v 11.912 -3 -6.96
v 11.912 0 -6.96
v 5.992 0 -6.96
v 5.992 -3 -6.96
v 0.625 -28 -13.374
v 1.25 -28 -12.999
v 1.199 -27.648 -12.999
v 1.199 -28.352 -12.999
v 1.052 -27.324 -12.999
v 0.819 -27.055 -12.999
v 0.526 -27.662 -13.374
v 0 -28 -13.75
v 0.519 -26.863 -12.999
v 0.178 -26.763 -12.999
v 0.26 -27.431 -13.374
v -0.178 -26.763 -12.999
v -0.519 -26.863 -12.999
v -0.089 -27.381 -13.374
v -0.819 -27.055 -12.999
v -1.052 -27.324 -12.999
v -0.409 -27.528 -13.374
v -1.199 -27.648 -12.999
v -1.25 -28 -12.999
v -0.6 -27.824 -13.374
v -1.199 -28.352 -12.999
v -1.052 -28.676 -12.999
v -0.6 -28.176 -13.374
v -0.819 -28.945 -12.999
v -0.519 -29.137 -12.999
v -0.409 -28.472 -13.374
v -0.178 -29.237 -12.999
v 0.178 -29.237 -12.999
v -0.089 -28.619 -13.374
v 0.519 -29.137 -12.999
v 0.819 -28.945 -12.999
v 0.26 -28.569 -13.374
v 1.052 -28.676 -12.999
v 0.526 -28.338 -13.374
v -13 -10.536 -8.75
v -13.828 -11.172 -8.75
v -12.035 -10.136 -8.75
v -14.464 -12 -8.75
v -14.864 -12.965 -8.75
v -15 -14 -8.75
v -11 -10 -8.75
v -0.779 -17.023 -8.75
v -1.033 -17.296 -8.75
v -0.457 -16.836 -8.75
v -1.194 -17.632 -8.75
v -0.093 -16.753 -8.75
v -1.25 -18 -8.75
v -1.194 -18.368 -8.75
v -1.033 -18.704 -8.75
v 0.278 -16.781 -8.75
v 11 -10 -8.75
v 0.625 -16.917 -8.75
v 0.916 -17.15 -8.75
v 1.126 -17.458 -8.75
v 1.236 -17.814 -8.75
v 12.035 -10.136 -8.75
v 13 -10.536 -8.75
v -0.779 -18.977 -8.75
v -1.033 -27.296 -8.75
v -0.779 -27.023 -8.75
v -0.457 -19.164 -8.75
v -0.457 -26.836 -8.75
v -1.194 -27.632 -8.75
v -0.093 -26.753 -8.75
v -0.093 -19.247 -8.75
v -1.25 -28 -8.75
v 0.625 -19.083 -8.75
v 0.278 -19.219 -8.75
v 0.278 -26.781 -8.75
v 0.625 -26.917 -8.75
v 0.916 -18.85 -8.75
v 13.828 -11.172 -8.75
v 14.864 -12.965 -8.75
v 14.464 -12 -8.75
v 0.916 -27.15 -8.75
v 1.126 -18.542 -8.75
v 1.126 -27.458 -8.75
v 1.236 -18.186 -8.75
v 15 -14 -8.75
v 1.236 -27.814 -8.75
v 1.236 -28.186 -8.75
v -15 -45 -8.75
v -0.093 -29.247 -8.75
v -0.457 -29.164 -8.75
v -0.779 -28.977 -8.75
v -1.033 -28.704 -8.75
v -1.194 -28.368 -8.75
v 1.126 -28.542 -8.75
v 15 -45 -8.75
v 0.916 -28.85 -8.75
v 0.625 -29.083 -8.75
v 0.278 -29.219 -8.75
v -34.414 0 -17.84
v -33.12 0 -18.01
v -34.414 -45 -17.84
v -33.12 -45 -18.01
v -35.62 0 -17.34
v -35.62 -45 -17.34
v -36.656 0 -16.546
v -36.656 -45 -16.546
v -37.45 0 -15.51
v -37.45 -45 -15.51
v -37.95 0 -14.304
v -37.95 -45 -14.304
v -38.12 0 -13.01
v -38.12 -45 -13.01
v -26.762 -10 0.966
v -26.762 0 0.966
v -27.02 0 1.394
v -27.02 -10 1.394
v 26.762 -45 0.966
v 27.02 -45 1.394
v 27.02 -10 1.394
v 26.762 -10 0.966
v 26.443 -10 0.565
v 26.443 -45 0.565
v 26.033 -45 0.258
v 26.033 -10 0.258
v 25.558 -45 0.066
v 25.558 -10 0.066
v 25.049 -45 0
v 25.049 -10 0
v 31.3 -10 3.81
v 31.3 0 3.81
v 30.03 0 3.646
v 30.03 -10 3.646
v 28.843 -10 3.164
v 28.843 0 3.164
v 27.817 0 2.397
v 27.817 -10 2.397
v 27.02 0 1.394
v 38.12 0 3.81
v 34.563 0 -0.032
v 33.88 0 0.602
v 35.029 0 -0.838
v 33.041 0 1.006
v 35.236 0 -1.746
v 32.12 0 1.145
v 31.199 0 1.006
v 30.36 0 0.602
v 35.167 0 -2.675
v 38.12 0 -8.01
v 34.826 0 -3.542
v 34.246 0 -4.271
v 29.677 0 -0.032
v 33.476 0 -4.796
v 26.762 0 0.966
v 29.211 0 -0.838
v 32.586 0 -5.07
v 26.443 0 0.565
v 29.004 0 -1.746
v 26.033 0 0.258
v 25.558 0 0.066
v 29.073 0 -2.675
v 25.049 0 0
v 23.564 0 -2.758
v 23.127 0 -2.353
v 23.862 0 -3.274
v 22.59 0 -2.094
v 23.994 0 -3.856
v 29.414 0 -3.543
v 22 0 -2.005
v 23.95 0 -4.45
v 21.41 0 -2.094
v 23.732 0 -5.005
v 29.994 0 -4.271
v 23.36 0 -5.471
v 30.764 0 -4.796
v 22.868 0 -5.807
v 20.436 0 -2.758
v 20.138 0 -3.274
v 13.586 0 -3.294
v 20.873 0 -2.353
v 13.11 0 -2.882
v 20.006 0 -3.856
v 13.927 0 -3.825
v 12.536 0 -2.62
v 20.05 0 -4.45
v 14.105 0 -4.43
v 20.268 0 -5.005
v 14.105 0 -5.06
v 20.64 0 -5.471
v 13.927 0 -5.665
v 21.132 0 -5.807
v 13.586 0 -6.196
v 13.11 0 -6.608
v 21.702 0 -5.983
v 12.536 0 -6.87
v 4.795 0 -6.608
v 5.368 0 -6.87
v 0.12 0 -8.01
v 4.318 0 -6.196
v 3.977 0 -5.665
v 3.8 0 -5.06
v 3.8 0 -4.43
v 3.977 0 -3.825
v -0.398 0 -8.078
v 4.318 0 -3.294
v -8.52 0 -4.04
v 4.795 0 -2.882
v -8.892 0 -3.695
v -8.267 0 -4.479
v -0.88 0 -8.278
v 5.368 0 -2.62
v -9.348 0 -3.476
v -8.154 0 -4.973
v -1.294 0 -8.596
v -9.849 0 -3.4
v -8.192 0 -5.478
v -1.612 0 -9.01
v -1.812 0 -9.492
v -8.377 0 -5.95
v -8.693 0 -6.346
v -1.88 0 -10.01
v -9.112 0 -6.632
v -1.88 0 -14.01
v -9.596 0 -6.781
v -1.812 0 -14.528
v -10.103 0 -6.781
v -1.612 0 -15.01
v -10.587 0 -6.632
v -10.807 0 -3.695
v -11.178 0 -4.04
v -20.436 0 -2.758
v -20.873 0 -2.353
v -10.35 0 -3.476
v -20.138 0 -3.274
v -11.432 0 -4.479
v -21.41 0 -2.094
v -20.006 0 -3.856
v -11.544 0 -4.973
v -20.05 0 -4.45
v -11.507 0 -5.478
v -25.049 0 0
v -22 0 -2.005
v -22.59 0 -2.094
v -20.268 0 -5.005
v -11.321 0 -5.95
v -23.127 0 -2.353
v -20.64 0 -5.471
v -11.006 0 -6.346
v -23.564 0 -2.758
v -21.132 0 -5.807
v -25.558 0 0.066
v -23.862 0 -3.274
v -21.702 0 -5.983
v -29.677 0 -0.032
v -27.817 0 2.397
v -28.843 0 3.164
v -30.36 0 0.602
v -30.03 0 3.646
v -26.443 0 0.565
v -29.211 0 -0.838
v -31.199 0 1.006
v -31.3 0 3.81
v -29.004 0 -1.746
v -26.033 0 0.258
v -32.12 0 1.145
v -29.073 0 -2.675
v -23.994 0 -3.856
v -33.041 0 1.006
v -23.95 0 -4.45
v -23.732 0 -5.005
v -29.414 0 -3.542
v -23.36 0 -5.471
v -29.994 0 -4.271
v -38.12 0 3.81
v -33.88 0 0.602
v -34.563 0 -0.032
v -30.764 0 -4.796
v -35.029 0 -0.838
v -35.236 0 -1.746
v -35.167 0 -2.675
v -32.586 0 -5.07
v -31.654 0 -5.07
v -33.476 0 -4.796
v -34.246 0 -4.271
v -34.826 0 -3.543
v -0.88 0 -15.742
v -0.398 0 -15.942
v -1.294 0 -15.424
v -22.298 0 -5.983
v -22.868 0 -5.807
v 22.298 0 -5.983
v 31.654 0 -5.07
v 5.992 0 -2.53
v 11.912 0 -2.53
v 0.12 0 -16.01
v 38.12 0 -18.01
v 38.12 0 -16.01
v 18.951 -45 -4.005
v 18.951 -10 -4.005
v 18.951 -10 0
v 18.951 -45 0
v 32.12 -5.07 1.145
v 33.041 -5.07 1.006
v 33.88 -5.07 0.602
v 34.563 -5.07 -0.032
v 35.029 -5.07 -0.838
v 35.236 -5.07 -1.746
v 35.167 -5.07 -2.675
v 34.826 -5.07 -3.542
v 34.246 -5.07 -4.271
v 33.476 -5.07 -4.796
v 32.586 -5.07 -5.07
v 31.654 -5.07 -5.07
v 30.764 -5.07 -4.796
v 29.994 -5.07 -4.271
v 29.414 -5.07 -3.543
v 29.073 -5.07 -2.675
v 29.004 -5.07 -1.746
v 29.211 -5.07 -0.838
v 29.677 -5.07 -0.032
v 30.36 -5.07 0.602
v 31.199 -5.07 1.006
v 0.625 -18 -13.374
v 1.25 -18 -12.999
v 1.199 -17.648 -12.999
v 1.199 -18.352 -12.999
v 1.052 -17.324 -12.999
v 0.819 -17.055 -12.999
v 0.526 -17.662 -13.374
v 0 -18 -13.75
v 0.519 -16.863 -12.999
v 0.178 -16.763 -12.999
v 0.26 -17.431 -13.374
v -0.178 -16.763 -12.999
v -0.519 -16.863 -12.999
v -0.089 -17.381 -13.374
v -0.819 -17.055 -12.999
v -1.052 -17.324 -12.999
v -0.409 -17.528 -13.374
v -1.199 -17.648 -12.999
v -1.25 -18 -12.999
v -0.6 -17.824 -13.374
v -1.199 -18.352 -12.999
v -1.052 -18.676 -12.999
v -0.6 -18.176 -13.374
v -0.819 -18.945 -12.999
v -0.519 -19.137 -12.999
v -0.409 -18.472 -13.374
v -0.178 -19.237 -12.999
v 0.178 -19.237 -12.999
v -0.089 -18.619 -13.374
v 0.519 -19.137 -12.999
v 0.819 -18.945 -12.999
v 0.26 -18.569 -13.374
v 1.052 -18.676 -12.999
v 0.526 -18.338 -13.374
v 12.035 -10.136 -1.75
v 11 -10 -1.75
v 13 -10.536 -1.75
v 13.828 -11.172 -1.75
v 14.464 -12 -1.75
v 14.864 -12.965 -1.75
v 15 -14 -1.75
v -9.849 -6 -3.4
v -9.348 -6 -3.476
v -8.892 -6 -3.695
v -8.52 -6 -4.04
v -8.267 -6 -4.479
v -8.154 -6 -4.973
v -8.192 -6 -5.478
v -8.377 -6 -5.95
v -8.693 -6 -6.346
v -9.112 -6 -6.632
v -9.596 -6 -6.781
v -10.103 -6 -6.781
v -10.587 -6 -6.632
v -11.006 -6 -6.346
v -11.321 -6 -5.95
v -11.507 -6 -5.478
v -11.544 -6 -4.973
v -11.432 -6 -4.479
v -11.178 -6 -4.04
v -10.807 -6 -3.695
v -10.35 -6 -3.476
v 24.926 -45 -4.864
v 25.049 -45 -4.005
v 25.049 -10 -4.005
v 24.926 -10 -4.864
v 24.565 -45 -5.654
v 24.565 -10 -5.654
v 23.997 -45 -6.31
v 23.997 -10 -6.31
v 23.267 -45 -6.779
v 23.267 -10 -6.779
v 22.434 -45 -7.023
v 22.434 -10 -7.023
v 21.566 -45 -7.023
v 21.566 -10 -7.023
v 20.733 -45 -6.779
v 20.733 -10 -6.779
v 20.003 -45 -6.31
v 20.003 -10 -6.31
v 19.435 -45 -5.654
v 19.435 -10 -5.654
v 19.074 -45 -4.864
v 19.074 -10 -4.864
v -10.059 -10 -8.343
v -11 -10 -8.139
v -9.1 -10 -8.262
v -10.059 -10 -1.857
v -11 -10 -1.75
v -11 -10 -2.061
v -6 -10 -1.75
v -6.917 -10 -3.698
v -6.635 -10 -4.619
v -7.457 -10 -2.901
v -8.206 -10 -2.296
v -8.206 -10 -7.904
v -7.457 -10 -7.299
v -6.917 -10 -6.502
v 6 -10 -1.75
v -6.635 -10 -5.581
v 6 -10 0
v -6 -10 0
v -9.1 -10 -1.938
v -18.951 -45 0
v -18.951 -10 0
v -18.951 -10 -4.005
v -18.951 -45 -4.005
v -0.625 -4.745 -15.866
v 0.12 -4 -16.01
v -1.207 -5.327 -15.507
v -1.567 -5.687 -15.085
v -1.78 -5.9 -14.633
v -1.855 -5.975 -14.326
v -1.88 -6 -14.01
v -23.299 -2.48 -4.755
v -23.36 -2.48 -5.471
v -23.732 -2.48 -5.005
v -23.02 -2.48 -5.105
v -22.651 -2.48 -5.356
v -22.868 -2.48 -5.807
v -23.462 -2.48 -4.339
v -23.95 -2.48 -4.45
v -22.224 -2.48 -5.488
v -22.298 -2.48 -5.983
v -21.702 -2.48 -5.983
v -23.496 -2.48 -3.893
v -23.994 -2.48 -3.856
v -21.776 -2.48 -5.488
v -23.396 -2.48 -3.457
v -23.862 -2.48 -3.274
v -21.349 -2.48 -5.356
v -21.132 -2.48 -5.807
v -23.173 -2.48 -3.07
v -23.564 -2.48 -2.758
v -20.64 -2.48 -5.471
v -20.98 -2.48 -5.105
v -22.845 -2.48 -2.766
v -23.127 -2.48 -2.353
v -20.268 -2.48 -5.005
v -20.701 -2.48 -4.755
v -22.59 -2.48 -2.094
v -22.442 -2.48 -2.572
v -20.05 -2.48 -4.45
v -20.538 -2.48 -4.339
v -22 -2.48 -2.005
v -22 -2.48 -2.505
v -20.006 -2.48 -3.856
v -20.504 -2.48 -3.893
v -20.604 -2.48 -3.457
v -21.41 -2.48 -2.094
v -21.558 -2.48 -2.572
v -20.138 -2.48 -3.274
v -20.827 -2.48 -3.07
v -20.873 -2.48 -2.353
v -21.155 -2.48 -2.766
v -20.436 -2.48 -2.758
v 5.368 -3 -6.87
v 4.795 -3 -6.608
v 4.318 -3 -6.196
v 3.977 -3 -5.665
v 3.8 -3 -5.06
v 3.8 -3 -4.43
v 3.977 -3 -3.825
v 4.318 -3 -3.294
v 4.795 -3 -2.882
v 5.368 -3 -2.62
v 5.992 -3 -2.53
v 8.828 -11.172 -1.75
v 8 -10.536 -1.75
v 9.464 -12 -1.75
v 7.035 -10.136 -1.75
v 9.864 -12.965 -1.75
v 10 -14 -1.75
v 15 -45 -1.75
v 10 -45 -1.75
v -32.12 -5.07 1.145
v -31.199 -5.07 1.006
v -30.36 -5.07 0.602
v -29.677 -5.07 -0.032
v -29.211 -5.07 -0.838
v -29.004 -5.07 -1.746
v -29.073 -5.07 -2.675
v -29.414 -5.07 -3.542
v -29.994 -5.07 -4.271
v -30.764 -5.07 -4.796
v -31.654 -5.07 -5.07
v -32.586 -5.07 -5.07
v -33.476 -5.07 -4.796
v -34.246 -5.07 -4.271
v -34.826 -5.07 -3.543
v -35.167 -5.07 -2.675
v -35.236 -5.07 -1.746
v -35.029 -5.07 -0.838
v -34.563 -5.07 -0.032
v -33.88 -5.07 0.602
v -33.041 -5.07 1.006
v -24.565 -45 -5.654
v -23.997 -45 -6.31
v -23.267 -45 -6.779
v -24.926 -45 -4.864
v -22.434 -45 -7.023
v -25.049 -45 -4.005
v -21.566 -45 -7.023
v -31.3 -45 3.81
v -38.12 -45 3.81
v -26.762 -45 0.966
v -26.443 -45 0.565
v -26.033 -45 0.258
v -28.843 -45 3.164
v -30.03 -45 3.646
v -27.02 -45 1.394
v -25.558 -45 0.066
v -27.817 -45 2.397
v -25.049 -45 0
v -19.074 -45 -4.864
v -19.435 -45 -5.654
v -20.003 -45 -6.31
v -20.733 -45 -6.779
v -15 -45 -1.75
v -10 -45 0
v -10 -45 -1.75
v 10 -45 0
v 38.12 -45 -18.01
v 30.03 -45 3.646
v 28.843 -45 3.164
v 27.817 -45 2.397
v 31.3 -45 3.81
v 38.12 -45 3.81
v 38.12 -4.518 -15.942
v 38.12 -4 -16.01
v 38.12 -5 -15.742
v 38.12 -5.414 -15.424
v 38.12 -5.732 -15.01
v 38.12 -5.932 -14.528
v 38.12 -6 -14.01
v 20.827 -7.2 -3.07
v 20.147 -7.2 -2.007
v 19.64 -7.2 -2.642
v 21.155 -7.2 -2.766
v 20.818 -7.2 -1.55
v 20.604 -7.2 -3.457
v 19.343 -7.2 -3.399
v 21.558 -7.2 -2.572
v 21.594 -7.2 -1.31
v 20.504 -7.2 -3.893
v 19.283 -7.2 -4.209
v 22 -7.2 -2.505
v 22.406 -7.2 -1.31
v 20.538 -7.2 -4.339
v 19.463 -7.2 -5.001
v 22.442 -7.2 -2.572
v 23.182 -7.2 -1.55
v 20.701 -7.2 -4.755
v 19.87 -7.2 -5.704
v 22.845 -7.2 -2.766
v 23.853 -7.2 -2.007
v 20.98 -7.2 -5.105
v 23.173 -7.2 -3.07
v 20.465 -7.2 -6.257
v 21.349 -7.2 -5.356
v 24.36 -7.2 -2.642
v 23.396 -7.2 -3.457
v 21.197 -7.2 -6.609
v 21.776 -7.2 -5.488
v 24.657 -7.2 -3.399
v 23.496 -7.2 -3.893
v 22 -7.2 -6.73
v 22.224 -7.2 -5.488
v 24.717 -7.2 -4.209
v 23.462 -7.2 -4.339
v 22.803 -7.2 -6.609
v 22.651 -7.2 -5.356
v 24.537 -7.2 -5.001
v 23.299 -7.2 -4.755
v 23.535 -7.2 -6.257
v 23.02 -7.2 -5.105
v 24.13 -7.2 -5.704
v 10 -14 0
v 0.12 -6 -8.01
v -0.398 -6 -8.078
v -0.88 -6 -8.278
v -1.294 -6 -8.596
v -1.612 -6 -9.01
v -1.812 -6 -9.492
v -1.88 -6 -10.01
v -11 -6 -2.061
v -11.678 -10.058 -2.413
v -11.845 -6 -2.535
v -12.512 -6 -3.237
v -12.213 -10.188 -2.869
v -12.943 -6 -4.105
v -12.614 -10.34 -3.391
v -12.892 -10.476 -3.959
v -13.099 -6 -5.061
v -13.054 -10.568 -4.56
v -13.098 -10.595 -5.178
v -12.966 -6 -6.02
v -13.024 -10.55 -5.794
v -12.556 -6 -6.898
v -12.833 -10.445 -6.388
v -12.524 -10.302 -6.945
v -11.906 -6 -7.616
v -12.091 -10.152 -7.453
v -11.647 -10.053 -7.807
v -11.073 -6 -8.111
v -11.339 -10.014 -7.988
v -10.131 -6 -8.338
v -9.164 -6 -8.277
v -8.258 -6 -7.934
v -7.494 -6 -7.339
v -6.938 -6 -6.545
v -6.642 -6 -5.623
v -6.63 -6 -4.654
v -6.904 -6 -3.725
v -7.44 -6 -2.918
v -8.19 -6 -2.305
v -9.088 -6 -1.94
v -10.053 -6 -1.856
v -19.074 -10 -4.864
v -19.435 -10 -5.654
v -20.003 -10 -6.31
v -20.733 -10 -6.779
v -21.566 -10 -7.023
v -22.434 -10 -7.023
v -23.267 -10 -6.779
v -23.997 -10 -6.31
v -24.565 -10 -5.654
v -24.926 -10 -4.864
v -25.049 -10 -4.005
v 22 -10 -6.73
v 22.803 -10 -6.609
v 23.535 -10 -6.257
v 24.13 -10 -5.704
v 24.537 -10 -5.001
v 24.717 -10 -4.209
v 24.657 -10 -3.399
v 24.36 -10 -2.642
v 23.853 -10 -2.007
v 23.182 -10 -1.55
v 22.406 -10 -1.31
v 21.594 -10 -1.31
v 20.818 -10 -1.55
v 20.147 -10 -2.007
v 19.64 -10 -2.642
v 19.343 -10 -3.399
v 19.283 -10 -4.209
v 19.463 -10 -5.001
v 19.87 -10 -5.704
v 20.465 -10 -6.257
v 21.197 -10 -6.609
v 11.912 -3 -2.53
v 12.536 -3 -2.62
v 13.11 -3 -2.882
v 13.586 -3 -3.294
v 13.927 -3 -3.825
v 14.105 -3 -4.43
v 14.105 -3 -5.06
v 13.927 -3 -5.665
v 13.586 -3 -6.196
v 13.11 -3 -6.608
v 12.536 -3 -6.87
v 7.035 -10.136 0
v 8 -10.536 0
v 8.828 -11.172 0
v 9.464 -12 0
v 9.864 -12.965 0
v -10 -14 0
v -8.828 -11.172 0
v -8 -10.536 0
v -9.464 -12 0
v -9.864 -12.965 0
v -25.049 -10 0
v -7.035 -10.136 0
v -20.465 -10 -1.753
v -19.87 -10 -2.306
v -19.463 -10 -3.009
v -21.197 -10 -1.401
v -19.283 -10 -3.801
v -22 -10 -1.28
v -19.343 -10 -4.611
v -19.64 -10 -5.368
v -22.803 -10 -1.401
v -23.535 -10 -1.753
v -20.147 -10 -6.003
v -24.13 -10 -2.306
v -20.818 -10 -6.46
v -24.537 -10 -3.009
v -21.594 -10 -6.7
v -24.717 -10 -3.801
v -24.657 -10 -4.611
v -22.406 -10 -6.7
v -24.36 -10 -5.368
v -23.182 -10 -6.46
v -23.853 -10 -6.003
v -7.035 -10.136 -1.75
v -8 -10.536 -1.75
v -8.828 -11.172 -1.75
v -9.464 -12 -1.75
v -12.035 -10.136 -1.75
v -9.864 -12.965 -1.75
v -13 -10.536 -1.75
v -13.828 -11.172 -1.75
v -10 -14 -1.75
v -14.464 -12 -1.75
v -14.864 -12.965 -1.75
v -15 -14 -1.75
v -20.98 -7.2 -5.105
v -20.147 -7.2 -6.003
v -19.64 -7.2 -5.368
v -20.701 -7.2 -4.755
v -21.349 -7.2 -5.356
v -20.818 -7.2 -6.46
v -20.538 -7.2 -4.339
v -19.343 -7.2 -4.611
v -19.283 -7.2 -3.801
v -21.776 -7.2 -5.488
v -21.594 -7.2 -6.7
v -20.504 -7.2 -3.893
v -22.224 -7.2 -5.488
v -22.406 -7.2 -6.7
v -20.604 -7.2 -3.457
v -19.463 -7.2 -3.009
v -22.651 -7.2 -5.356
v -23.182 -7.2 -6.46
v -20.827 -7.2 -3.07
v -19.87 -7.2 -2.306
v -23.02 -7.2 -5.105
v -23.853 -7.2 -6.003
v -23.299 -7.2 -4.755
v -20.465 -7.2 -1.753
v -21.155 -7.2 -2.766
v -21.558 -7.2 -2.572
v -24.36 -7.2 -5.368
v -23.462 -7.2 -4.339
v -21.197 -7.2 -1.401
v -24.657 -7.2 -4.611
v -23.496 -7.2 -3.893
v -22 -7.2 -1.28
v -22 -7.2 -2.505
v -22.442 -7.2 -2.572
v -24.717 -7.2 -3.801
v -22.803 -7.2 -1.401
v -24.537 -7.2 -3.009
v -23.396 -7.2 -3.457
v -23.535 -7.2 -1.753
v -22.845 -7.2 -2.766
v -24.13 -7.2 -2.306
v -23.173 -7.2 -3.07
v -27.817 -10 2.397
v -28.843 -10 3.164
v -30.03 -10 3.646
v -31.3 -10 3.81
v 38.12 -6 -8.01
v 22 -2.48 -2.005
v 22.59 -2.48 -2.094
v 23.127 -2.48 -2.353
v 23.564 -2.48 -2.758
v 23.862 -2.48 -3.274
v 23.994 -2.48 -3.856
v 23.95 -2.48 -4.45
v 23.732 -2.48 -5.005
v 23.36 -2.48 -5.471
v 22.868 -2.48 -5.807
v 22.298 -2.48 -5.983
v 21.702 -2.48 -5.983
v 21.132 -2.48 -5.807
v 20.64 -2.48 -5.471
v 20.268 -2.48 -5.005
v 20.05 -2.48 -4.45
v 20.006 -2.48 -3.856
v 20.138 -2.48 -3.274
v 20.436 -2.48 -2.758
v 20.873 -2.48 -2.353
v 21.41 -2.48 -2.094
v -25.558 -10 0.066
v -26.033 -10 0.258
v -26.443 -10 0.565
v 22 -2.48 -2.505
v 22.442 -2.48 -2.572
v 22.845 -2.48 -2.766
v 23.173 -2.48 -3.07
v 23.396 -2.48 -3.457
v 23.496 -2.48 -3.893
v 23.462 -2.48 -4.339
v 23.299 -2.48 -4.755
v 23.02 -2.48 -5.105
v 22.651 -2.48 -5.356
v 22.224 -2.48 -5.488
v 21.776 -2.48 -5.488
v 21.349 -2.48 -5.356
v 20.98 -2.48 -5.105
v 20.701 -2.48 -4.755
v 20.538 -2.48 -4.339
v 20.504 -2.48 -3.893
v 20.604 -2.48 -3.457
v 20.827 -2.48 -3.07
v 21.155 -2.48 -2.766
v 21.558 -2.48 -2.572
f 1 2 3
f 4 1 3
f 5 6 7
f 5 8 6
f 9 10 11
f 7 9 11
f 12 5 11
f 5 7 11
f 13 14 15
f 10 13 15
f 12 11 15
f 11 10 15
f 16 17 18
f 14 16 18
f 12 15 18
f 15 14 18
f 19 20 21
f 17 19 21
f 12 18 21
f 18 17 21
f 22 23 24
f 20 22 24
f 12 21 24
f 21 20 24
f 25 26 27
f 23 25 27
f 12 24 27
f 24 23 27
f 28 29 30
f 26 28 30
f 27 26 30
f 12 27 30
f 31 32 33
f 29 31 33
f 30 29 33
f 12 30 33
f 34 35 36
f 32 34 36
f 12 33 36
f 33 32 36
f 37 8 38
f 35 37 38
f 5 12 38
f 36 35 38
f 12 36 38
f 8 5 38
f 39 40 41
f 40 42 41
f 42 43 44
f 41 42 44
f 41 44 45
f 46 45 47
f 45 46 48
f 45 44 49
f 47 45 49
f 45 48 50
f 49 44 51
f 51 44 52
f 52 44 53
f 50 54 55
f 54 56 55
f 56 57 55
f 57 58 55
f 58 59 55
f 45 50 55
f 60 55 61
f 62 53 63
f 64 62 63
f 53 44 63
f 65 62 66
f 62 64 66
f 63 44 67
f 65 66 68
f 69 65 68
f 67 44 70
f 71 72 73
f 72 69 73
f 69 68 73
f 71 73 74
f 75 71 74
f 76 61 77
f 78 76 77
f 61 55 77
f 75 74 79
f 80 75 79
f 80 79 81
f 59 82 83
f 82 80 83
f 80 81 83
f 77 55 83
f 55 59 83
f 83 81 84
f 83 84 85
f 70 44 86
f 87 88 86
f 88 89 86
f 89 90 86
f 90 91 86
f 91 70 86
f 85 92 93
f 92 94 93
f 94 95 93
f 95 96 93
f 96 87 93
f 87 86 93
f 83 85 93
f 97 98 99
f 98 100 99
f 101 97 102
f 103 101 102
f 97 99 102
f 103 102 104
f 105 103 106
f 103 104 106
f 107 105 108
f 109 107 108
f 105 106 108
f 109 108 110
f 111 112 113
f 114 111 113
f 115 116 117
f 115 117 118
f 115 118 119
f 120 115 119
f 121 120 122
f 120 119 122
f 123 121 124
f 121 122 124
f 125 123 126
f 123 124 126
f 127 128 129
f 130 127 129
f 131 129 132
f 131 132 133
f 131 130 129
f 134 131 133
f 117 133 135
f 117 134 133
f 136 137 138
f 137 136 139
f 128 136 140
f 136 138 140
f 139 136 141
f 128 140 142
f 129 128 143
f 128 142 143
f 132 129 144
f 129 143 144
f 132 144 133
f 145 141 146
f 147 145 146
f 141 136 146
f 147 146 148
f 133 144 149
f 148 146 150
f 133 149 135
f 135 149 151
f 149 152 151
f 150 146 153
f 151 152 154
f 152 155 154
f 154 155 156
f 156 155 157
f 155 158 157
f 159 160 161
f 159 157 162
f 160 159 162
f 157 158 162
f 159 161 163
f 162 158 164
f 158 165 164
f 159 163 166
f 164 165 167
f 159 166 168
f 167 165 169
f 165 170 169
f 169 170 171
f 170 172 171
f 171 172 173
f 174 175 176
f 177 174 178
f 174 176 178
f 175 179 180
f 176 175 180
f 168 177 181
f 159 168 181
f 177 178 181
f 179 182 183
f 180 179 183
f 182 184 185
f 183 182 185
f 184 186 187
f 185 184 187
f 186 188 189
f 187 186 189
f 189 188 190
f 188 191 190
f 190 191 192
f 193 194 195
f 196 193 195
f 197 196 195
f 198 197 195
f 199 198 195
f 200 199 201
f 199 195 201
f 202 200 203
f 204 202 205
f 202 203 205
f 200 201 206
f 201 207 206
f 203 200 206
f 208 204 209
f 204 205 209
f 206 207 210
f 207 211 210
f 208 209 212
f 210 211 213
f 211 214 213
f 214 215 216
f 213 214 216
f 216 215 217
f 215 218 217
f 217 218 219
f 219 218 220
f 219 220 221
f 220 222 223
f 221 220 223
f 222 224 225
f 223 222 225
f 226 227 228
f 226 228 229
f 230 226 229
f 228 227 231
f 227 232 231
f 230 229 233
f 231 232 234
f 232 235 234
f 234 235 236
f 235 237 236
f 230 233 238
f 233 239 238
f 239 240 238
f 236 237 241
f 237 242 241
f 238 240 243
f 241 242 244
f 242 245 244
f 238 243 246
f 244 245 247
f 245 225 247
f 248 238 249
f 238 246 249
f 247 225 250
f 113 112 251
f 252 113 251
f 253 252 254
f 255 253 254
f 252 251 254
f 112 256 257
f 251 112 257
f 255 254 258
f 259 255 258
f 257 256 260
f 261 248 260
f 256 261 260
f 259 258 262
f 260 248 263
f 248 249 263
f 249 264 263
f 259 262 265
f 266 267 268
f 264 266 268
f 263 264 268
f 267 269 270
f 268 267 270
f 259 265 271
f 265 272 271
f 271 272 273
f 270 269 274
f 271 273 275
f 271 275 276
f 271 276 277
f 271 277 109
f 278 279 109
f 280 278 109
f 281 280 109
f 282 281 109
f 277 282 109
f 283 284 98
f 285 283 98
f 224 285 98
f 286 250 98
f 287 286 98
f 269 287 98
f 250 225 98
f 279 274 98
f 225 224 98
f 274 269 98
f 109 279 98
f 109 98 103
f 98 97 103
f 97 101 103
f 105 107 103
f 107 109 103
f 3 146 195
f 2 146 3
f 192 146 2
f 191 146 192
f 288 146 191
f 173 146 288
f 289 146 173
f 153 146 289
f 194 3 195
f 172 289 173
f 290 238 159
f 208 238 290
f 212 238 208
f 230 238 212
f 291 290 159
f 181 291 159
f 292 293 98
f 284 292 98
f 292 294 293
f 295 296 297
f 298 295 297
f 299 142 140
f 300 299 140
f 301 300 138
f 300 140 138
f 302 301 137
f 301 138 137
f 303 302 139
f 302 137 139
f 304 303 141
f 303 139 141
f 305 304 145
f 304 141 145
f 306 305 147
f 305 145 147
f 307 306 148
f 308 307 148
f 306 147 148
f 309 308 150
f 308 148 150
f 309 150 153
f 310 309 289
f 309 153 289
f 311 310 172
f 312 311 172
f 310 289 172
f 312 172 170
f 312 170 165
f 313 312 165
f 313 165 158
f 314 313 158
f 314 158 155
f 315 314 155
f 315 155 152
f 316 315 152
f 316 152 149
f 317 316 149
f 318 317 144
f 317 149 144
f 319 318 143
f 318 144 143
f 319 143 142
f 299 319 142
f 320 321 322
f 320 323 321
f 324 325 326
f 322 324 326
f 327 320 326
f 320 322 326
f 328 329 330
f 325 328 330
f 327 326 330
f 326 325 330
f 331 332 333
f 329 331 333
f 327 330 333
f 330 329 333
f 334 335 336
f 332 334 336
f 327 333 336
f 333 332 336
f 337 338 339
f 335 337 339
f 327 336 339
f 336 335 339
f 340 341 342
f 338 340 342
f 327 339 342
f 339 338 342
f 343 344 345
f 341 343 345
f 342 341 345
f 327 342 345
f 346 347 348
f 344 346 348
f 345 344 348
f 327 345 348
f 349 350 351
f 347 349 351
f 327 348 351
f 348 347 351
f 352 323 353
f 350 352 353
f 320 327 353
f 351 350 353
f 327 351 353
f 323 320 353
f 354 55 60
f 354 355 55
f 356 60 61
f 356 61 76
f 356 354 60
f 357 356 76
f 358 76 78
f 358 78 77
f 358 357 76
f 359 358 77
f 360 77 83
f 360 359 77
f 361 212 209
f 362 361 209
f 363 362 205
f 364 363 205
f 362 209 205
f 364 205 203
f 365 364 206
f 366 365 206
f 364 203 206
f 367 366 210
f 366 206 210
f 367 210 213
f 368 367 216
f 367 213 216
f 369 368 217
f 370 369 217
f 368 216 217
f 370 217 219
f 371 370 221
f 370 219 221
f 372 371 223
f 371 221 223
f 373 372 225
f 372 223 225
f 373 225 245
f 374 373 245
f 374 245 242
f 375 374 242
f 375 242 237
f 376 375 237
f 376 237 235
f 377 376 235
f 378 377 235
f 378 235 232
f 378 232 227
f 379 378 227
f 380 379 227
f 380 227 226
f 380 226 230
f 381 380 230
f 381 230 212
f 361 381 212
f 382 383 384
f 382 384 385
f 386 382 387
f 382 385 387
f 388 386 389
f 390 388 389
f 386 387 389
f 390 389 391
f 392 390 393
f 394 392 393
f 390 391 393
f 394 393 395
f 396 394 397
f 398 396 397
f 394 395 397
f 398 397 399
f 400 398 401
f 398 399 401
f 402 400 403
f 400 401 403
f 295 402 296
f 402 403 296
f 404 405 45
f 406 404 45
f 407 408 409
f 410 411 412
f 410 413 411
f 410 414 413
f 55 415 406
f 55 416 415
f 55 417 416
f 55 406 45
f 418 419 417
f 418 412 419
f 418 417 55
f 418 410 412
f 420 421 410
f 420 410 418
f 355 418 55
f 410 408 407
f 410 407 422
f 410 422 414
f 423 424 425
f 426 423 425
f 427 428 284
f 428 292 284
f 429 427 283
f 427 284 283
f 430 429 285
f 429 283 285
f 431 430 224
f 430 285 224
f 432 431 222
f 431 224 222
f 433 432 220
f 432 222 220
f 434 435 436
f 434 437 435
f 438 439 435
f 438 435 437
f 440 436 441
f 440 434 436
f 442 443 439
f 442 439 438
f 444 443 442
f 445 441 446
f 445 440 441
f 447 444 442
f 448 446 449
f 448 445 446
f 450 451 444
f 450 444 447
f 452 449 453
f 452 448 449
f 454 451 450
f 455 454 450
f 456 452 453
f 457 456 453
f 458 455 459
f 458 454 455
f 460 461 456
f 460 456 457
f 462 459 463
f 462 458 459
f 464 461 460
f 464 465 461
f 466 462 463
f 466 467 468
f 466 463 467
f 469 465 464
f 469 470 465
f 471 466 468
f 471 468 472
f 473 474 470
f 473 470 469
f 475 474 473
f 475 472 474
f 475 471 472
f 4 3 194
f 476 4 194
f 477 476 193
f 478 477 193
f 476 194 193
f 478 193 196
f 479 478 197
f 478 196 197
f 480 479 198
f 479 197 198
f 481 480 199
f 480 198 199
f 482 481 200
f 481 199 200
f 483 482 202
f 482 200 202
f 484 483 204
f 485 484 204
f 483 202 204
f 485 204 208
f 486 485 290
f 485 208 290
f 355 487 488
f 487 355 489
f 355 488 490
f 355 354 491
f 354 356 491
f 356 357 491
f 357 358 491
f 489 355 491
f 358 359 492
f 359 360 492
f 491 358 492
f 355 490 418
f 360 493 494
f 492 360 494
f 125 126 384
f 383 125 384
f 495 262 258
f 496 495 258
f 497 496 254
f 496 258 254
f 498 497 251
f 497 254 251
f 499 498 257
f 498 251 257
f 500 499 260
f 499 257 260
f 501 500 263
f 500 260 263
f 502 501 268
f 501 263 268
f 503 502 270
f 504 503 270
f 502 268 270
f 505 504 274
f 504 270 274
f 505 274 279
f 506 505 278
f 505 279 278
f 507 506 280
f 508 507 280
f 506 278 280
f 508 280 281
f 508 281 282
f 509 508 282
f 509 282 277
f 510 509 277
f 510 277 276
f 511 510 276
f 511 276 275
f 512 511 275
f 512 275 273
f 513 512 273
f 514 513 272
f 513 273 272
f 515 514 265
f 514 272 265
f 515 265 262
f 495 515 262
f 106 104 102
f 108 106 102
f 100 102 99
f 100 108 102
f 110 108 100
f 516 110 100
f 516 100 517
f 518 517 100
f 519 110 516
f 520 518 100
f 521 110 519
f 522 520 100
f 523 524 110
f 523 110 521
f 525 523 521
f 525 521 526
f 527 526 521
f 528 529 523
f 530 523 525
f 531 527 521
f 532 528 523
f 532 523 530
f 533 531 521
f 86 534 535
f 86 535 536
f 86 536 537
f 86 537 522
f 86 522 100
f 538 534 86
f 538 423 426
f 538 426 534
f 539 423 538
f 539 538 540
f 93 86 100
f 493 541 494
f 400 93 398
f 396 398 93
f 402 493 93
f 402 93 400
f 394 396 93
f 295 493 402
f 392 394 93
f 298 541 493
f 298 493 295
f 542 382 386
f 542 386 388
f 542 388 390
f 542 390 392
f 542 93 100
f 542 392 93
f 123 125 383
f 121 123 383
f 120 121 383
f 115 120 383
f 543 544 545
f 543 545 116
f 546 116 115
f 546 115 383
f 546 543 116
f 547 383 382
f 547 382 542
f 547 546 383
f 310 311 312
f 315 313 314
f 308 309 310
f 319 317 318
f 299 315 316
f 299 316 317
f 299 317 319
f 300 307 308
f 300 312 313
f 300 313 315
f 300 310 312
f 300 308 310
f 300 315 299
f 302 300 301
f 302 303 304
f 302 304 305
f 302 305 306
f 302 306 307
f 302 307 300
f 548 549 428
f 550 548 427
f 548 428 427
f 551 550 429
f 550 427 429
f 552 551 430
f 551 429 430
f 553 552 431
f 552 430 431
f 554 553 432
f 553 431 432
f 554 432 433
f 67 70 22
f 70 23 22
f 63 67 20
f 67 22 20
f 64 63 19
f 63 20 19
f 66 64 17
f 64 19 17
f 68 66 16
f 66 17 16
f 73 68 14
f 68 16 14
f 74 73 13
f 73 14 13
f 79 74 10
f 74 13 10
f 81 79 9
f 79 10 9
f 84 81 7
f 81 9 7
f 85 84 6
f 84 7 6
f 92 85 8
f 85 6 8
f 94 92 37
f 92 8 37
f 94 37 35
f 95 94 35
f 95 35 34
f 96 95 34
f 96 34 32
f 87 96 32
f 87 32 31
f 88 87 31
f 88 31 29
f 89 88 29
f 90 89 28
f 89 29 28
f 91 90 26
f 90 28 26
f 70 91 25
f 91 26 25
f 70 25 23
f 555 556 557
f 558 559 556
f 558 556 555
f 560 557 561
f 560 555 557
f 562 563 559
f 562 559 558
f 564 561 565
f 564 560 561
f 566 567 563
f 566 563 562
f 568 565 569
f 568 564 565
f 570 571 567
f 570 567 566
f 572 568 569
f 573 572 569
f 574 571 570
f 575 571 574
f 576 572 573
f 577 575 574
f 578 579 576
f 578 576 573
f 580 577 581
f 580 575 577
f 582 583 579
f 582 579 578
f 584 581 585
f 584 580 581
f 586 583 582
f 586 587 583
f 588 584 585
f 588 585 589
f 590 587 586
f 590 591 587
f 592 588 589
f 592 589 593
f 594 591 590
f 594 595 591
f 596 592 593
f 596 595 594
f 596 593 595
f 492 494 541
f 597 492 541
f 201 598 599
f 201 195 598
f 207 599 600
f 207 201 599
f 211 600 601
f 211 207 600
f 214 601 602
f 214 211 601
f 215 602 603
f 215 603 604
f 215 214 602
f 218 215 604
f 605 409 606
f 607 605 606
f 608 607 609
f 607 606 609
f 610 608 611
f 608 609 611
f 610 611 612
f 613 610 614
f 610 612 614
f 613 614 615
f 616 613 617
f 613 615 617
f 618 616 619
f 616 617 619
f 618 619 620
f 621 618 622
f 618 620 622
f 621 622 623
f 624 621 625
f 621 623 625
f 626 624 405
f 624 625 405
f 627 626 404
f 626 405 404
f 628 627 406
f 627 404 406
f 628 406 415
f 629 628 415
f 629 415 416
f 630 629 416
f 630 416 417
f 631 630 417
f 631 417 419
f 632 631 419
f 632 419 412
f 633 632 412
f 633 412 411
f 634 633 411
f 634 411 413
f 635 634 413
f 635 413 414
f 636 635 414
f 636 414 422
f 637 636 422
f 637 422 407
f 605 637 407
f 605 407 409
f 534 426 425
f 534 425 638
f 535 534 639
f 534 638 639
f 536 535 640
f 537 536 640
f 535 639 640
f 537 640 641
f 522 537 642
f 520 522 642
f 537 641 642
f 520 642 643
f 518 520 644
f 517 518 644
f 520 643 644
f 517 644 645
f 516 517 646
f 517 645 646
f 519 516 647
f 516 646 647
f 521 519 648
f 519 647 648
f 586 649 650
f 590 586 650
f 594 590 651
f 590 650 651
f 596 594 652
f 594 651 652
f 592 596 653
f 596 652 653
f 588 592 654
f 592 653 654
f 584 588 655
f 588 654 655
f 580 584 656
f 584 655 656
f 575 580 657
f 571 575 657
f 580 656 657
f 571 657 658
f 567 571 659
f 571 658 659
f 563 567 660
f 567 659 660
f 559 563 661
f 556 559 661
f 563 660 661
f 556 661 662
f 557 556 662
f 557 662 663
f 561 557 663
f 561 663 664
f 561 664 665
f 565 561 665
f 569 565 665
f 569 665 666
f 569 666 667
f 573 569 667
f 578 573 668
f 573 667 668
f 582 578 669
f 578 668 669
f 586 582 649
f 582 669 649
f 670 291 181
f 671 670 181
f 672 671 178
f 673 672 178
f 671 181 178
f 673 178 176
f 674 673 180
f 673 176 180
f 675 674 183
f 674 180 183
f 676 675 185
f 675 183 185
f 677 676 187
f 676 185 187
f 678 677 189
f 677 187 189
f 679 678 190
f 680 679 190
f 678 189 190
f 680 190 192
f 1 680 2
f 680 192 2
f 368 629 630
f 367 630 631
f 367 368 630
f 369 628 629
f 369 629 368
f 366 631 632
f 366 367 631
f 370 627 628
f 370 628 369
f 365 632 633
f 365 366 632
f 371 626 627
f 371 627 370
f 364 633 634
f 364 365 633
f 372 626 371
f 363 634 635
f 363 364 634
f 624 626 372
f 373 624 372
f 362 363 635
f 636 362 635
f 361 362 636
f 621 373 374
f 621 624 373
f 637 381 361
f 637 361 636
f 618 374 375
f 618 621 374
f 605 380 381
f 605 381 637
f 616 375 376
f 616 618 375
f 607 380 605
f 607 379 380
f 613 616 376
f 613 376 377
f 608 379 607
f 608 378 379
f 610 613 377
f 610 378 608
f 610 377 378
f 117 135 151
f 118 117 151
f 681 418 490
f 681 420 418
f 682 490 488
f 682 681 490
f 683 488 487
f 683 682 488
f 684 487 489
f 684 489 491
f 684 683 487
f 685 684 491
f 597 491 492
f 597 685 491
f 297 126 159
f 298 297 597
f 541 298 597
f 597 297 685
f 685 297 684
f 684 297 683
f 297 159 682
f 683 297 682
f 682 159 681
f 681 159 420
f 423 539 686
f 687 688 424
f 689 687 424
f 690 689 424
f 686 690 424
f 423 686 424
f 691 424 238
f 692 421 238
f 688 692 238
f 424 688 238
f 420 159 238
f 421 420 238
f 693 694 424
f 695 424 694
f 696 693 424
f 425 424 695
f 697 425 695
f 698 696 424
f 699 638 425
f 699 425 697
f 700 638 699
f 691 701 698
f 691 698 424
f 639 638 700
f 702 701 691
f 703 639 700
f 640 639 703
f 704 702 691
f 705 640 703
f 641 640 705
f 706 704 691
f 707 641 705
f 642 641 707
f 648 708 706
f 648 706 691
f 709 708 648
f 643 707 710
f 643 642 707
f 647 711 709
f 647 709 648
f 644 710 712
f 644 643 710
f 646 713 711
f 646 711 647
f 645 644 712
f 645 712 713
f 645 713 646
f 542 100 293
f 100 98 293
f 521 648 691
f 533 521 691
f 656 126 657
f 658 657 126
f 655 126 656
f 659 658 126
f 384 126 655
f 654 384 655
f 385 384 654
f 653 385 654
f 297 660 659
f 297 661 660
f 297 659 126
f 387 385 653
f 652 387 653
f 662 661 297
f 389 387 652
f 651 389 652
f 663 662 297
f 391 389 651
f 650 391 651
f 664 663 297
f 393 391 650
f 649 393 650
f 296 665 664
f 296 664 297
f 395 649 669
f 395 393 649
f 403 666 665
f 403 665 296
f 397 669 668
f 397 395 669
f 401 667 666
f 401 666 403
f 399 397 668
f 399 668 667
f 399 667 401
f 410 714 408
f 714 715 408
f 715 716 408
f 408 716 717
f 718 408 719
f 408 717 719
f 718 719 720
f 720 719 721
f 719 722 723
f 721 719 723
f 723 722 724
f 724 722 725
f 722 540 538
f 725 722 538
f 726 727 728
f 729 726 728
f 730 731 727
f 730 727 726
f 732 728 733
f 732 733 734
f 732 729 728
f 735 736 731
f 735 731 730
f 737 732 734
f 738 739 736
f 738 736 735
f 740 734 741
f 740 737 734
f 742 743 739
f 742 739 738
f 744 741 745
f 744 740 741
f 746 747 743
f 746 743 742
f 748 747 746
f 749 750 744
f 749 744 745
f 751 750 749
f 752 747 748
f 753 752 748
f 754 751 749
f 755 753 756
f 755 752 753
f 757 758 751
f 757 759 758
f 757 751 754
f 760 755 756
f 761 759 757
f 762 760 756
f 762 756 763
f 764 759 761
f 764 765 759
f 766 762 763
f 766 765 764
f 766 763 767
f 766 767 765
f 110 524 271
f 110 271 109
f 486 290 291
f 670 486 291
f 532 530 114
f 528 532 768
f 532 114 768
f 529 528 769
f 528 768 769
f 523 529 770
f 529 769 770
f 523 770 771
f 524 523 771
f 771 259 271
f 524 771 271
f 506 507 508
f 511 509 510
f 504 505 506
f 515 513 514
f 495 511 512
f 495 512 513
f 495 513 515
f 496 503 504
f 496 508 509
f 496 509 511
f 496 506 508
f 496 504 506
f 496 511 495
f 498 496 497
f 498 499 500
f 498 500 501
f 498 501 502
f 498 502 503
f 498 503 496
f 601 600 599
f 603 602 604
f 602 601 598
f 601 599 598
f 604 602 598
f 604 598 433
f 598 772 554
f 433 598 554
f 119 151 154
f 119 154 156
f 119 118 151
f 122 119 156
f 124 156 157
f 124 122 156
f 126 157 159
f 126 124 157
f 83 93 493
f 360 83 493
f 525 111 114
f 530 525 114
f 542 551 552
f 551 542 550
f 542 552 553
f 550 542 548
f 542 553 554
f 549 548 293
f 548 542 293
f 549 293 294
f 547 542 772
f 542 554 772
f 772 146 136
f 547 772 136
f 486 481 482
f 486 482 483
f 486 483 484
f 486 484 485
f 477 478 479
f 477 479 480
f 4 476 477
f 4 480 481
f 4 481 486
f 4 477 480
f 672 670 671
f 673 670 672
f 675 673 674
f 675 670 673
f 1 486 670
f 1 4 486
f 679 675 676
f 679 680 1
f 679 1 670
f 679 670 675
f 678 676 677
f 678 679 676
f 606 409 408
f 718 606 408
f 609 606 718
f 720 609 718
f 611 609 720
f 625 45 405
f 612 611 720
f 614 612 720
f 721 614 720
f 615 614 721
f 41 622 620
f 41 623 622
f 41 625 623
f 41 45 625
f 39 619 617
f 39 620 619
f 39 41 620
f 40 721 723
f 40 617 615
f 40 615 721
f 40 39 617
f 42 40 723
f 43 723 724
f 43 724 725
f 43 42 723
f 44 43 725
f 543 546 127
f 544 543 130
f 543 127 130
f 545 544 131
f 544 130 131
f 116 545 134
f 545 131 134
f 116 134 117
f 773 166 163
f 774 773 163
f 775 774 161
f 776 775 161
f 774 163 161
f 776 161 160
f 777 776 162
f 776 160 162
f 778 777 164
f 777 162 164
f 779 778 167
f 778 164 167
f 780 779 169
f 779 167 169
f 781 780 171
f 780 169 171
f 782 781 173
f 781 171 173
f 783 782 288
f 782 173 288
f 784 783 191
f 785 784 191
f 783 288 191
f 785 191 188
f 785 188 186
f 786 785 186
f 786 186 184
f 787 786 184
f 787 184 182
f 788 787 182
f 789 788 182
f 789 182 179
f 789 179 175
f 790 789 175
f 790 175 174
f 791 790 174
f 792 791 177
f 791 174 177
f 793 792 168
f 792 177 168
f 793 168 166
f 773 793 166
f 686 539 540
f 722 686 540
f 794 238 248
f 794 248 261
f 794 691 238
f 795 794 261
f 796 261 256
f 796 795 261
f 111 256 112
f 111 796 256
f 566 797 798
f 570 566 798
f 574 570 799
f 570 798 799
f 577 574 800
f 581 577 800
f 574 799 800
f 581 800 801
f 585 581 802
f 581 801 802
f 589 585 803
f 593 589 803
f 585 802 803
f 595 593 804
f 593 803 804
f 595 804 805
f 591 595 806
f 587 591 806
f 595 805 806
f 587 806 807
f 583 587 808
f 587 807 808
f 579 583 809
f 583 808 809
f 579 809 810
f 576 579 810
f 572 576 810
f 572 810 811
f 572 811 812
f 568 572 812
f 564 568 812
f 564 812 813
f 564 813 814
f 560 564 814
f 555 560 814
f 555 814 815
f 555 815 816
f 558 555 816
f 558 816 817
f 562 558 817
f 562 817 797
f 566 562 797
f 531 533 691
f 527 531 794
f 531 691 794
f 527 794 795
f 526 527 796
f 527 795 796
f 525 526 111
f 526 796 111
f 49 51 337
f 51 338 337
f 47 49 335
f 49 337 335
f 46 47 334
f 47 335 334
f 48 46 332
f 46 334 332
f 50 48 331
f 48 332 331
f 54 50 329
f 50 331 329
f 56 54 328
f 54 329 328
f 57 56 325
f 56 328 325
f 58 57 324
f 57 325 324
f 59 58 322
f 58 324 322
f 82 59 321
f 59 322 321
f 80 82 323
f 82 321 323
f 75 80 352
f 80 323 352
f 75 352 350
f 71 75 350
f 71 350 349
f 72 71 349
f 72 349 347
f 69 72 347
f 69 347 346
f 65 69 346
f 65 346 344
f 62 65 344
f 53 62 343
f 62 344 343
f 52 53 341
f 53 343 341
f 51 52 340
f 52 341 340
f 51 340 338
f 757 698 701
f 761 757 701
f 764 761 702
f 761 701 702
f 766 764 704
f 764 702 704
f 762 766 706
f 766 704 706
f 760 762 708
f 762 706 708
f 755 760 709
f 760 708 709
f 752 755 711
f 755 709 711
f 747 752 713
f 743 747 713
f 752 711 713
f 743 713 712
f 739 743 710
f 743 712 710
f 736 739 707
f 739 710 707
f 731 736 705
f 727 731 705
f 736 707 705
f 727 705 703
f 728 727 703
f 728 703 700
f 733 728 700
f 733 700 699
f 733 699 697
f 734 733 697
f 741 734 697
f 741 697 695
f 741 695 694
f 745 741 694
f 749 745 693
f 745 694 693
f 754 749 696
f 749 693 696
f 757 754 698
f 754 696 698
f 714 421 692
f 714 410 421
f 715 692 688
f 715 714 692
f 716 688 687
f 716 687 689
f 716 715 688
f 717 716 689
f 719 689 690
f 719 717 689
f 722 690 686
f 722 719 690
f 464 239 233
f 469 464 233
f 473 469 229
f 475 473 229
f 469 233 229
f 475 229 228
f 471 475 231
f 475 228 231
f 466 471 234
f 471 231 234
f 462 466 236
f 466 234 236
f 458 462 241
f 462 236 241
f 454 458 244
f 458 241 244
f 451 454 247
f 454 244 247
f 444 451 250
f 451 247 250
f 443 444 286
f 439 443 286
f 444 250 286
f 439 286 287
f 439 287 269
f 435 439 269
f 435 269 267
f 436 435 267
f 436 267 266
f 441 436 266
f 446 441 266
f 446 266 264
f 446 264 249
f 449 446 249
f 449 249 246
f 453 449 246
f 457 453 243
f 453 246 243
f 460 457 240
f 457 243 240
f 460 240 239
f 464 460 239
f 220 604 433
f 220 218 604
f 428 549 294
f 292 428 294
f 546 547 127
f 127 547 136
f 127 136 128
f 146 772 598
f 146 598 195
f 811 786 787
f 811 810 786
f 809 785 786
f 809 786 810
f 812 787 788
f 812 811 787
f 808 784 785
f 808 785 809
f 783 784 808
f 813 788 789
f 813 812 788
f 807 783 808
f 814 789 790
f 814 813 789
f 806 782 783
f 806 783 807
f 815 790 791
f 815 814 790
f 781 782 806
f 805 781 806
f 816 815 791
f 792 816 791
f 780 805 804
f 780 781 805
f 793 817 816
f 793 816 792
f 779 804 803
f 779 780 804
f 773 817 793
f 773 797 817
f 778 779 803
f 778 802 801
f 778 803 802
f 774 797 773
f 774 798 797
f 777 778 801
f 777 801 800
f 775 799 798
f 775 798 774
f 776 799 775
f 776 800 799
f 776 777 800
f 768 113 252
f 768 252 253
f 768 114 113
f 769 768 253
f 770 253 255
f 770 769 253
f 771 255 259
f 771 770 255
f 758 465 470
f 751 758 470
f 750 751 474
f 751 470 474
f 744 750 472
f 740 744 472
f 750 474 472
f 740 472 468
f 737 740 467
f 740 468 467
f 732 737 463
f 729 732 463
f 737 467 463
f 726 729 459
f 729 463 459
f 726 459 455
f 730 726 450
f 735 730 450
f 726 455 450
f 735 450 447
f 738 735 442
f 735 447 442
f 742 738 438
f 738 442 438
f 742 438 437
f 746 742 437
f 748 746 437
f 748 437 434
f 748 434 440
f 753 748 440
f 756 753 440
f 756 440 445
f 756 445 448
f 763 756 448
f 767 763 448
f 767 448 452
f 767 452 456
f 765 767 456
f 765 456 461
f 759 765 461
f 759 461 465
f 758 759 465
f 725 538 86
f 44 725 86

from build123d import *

# Parameters (mm, degrees)
SKETCH1_R                       = 2
SKETCH1_R_2                     = 3.125
SKETCH1_R_3                     = 1.7
BOSS_EXTRUDE1_DEPTH             = 10
FILLET2_R                       = 5
FILLET1_R                       = 2
SKETCH1_4_R                     = 3.125
CUT_EXTRUDE3_DEPTH              = 5.07
SKETCH1_7_R                     = 1.7
CUT_EXTRUDE6_DEPTH              = 10
CUT_EXTRUDE5_DEPTH              = 3
SKETCH1_5_R                     = 2
CUT_EXTRUDE4_DEPTH              = 2.48
SKETCH4_R                       = 1.5
CUT_EXTRUDE7_DEPTH              = 10
SKETCH5_R                       = 2.725
CUT_EXTRUDE8_DEPTH              = 2.8
BOSS_EXTRUDE2_DEPTH             = 10
BOSS_EXTRUDE3_DEPTH             = 35
FILLET13_R                      = 5
SKETCH10_W                      = 8
SKETCH10_H                      = 6
CUT_EXTRUDE12_DEPTH             = 40
FILLET14_R                      = 2
CUT_EXTRUDE17_DEPTH             = 35
TAP_DRILL_FOR_M3X0_5_TAP1_D     = 2.5
TAP_DRILL_FOR_M3X0_5_TAP1_DEPTH = 4.248924226
TAP_DRILL_FOR_M3X0_5_TAP1_TIP   = 0.751075774
SKETCH23_2_R                    = 3.25
BOSS_EXTRUDE7_DEPTH             = 2
FILLET16_R                      = 4
SKETCH23_R                      = 3.25
CUT_EXTRUDE20_DEPTH             = 10
CUT_EXTRUDE20_DEPTH_BACK        = 4


with BuildPart() as part:
    # Sketch1 → Boss-Extrude1 (new body)
    with BuildSketch(Plane(origin=(0, 0, 0), x_dir=(1, 0, 0), z_dir=(0, 1, 0))):
        with BuildLine():
            ThreePointArc((-11.409245094, 8.977987014), (-9.849239736, 9.28), (-8.289234378, 8.977987014))
            ThreePointArc((-8.289234378, 8.977987014), (-5.835653376, 8.254222737), (-3.289234378, 8.01))
            Line((-3.289234378, 8.01), (38.12, 8.01))
            Line((38.12, 8.01), (38.12, -3.81))
            Line((38.12, -3.81), (28.478275237, -3.81))
            Line((28.478275237, -3.81), (26.178275237, 0))
            Line((26.178275237, 0), (-26.178275237, 0))
            Line((-26.178275237, 0), (-28.478275237, -3.81))
            Line((-28.478275237, -3.81), (-38.12, -3.81))
            Line((-38.12, -3.81), (-38.12, 8.01))
            Line((-38.12, 8.01), (-16.409245094, 8.01))
            ThreePointArc((-16.409245094, 8.01), (-13.862826096, 8.254222737), (-11.409245094, 8.977987014))
        make_face()
        with Locations((22, 4.005)):
            Circle(SKETCH1_R, mode=Mode.SUBTRACT)
        with Locations((-22, 4.005)):
            Circle(SKETCH1_R, mode=Mode.SUBTRACT)
        with Locations((-32.12, 1.98)):
            Circle(SKETCH1_R_2, mode=Mode.SUBTRACT)
        with Locations((32.12, 1.98)):
            Circle(SKETCH1_R_2, mode=Mode.SUBTRACT)
        with Locations((-9.849239736, 5.1)):
            Circle(SKETCH1_R_3, mode=Mode.SUBTRACT)
        with BuildLine():
            ThreePointArc((11.912105026, 2.53), (14.127105026, 4.745), (11.912105026, 6.96))
            Line((11.912105026, 6.96), (5.992105026, 6.96))
            ThreePointArc((5.992105026, 6.96), (3.777105026, 4.745), (5.992105026, 2.53))
            Line((5.992105026, 2.53), (11.912105026, 2.53))
        make_face(mode=Mode.SUBTRACT)
        with Locations((-22, 4.005)):
            Circle(SKETCH1_R)
        with Locations((-9.849239736, 5.1)):
            Circle(SKETCH1_R_3)
        with Locations((-32.12, 1.98)):
            Circle(SKETCH1_R_2)
        with BuildLine():
            Line((5.992105026, 2.53), (11.912105026, 2.53))
            ThreePointArc((11.912105026, 2.53), (14.127105026, 4.745), (11.912105026, 6.96))
            Line((11.912105026, 6.96), (5.992105026, 6.96))
            ThreePointArc((5.992105026, 6.96), (3.777105026, 4.745), (5.992105026, 2.53))
        make_face()
        with Locations((22, 4.005)):
            Circle(SKETCH1_R)
        with Locations((32.12, 1.98)):
            Circle(SKETCH1_R_2)
    extrude(amount=-BOSS_EXTRUDE1_DEPTH)

    # Fillet2
    fillet2_edges = [part.edges().sort_by_distance(p)[0] for p in [
        (28.478275237, -5, 3.81),
        (-28.478275237, -5, 3.81),
    ]]
    fillet(fillet2_edges, radius=FILLET2_R)

    # Fillet1
    fillet1_edges = [part.edges().sort_by_distance(p)[0] for p in [
        (26.178275237, -5, 0),
        (-26.178275237, -5, 0),
    ]]
    fillet(fillet1_edges, radius=FILLET1_R)

    # Sketch1_4 → Cut-Extrude3 (cut)
    with BuildSketch(Plane(origin=(0, 0, 0), x_dir=(1, 0, 0), z_dir=(0, 1, 0))):
        with Locations(Location((32.12, 1.98, 0), (0, 0, 270))):
            Circle(SKETCH1_4_R)
        with Locations(Location((-32.12, 1.98, 0), (0, 0, 270))):
            Circle(SKETCH1_4_R)
    extrude(amount=-CUT_EXTRUDE3_DEPTH, mode=Mode.SUBTRACT)

    # Sketch1_7 → Cut-Extrude6 (cut)
    with BuildSketch(Plane(origin=(0, 0, 0), x_dir=(1, 0, 0), z_dir=(0, 1, 0))):
        with Locations(Location((-9.849239736, 5.1, 0), (0, 0, 270))):
            Circle(SKETCH1_7_R)
    extrude(amount=-CUT_EXTRUDE6_DEPTH, mode=Mode.SUBTRACT)

    # Sketch1_6 → Cut-Extrude5 (cut)
    with BuildSketch(Plane(origin=(0, 0, 0), x_dir=(1, 0, 0), z_dir=(0, 1, 0))):
        with BuildLine():
            Line((5.992105026, 2.53), (11.912105026, 2.53))
            ThreePointArc((11.912105026, 2.53), (14.127105026, 4.745), (11.912105026, 6.96))
            Line((11.912105026, 6.96), (5.992105026, 6.96))
            ThreePointArc((5.992105026, 6.96), (3.777105026, 4.745), (5.992105026, 2.53))
        make_face()
    extrude(amount=-CUT_EXTRUDE5_DEPTH, mode=Mode.SUBTRACT)

    # Sketch1_5 → Cut-Extrude4 (cut)
    with BuildSketch(Plane(origin=(0, 0, 0), x_dir=(1, 0, 0), z_dir=(0, 1, 0))):
        with Locations(Location((-22, 4.005, 0), (0, 0, 270))):
            Circle(SKETCH1_5_R)
        with Locations(Location((22, 4.005, 0), (0, 0, 270))):
            Circle(SKETCH1_5_R)
    extrude(amount=-CUT_EXTRUDE4_DEPTH, mode=Mode.SUBTRACT)

    # Sketch4 → Cut-Extrude7 (cut)
    with BuildSketch(Plane(origin=(0, 0, 0), x_dir=(1, 0, 0), z_dir=(0, 1, 0))):
        with Locations(Location((-22, 4.005, 0), (0, 0, 270))):
            Circle(SKETCH4_R)
        with Locations(Location((22, 4.005, 0), (0, 0, 270))):
            Circle(SKETCH4_R)
    extrude(amount=-CUT_EXTRUDE7_DEPTH, mode=Mode.SUBTRACT)

    # Sketch5 → Cut-Extrude8 (cut)
    with BuildSketch(Plane.XZ.offset(10)):
        with Locations(Location((22, -4.005, 0), (0, 0, 270))):
            Circle(SKETCH5_R)
        with Locations(Location((-22, -4.005, 0), (0, 0, 90))):
            Circle(SKETCH5_R)
    extrude(amount=-CUT_EXTRUDE8_DEPTH, mode=Mode.SUBTRACT)

    # Sketch6 → Boss-Extrude2 (add)
    with BuildSketch(Plane(origin=(0, 0, 0), x_dir=(1, 0, 0), z_dir=(0, 1, 0))):
        with BuildLine():
            Line((-38.12, 8.01), (-38.12, 18.01))
            Line((-38.12, 18.01), (38.12, 18.01))
            Line((38.12, 18.01), (38.12, 8.01))
            Line((38.12, 8.01), (-3.289234378, 8.01))
            ThreePointArc((-3.289234378, 8.01), (-5.835653376, 8.254222737), (-8.289234378, 8.977987014))
            ThreePointArc((-8.289234378, 8.977987014), (-9.849239736, 9.28), (-11.409245094, 8.977987014))
            ThreePointArc((-11.409245094, 8.977987014), (-13.862826096, 8.254222737), (-16.409245094, 8.01))
            Line((-16.409245094, 8.01), (-38.12, 8.01))
        make_face()
    extrude(amount=-BOSS_EXTRUDE2_DEPTH)

    # Sketch8 → Boss-Extrude3 (add)
    with BuildSketch(Plane.XZ.offset(10)):
        with BuildLine():
            Line((18.950546011, 0), (-18.950546011, 0))
            Line((-18.950546011, 0), (-18.950546011, -4.005))
            ThreePointArc((-18.950546011, -4.005), (-22, -7.054453989), (-25.049453989, -4.005))
            Line((-25.049453989, -4.005), (-25.049453989, 0))
            ThreePointArc((-25.049453989, 0), (-26.032503369, 0.25827272), (-26.761657912, 0.966386084))
            Line((-26.761657912, 0.966386084), (-27.019818549, 1.394034791))
            ThreePointArc((-27.019818549, 1.394034791), (-28.842704905, 3.164318199), (-31.300328355, 3.81))
            Line((-31.300328355, 3.81), (-38.12, 3.81))
            Line((-38.12, 3.81), (-38.12, -18.01))
            Line((-38.12, -18.01), (38.12, -18.01))
            Line((38.12, -18.01), (38.12, 3.81))
            Line((38.12, 3.81), (31.300328355, 3.81))
            ThreePointArc((31.300328355, 3.81), (28.842704905, 3.164318199), (27.019818549, 1.394034791))
            Line((27.019818549, 1.394034791), (26.761657912, 0.966386084))
            ThreePointArc((26.761657912, 0.966386084), (26.032503369, 0.25827272), (25.049453989, 0))
            Line((25.049453989, 0), (25.049453989, -4.005))
            ThreePointArc((25.049453989, -4.005), (22, -7.054453989), (18.950546011, -4.005))
            Line((18.950546011, -4.005), (18.950546011, 0))
        make_face()
    extrude(amount=BOSS_EXTRUDE3_DEPTH)

    # Fillet13
    fillet13_edges = [part.edges().sort_by_distance(p)[0] for p in [
        (-38.12, -22.5, -18.01),
    ]]
    fillet(fillet13_edges, radius=FILLET13_R)

    # Sketch10 → Cut-Extrude12 (cut)
    with BuildSketch(Plane(origin=(38.12, 0, 0), x_dir=(0, 0, -1), z_dir=(1, 0, 0))):
        with Locations((12.01, -3)):
            Rectangle(SKETCH10_W, SKETCH10_H)
    extrude(amount=-CUT_EXTRUDE12_DEPTH, mode=Mode.SUBTRACT)

    # Fillet14
    fillet14_edges = [part.edges().sort_by_distance(p)[0] for p in [
        (-1.88, -3, -16.01),
        (18.12, -6, -16.01),
        (-1.88, -3, -8.01),
    ]]
    fillet(fillet14_edges, radius=FILLET14_R)

    # Sketch18 → Cut-Extrude17 (cut)
    with BuildSketch(Plane.XZ.offset(45)):
        Polygon((-10, 0), (-10, -1.75), (-15, -1.75), (-15, -8.75), (15, -8.75), (15, -1.75), (10, -1.75), (10, 0), align=None)
    extrude(amount=-CUT_EXTRUDE17_DEPTH, mode=Mode.SUBTRACT)

    # Tap Drill for M3x0.5 Tap1
    with Locations(Plane.XY.offset(-8.75)):
        with Locations((0, -28), (0, -18)):
            Hole(TAP_DRILL_FOR_M3X0_5_TAP1_D / 2, depth=TAP_DRILL_FOR_M3X0_5_TAP1_DEPTH)
            with Locations((0, 0, -(TAP_DRILL_FOR_M3X0_5_TAP1_DEPTH + TAP_DRILL_FOR_M3X0_5_TAP1_TIP / 2))):  # 118° drill point
                Cone(0, TAP_DRILL_FOR_M3X0_5_TAP1_D / 2, TAP_DRILL_FOR_M3X0_5_TAP1_TIP, mode=Mode.SUBTRACT)

    # Sketch23_2 → Boss-Extrude7 (add)
    with BuildSketch(Plane.XZ.offset(10)):
        with Locations((-9.849239736, -5.1)):
            Circle(SKETCH23_2_R)
    extrude(amount=-BOSS_EXTRUDE7_DEPTH)

    # Fillet16
    fillet16_edges = [part.edges().sort_by_distance(p)[0] for p in [
        (-10, -10, -0.875),
        (-15, -10, -5.25),
        (15, -10, -5.25),
        (10, -10, -0.875),
    ]]
    fillet(fillet16_edges, radius=FILLET16_R)

    # Sketch23 → Cut-Extrude20 (cut, two sides)
    with BuildSketch(Plane.XZ.offset(10)) as cut_extrude20_sk:
        with Locations(Location((-9.849239736, -5.1, 0), (0, 0, 110.737075226))):
            Circle(SKETCH23_R)
    extrude(amount=CUT_EXTRUDE20_DEPTH, mode=Mode.SUBTRACT)
    extrude(cut_extrude20_sk.sketch, amount=-CUT_EXTRUDE20_DEPTH_BACK, mode=Mode.SUBTRACT)


solid = part.part
